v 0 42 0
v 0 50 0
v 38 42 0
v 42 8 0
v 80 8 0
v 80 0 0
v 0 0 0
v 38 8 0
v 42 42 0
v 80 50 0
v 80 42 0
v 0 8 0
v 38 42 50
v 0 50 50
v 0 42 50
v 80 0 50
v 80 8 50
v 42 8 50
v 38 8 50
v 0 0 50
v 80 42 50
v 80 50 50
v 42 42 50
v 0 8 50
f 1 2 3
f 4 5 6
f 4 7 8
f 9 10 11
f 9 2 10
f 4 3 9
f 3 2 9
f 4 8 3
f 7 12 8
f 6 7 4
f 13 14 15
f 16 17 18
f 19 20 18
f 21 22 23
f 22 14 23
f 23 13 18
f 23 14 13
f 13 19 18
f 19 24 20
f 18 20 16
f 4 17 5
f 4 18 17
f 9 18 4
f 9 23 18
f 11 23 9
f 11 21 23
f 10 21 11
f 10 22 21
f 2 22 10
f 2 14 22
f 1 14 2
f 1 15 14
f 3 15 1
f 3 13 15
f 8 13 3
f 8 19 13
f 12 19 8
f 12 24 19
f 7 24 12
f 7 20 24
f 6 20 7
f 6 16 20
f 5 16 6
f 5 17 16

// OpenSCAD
$fn = 32;

// ----------------------------------------------------------------------
// Structural section: ibeam 80 x 50 mm
// ----------------------------------------------------------------------

// --- parameters (mm) ---
sec_w = 80;               // section width, X
sec_h = 50;               // section height, Y
flange_t = 8;             // flange thickness
web_t = 4;                // web thickness
plate_t = 50;             // cut length, Z (extrusion height)

profile = [[0, 0], [80, 0], [80, 8], [42, 8], [42, 42], [80, 42], [80, 50], [0, 50], [0, 42], [38, 42], [38, 8], [0, 8]];  // primary outline, 12 points, counter clockwise

// --- the one profile operation ---
linear_extrude(height = plate_t) polygon(points = profile);
